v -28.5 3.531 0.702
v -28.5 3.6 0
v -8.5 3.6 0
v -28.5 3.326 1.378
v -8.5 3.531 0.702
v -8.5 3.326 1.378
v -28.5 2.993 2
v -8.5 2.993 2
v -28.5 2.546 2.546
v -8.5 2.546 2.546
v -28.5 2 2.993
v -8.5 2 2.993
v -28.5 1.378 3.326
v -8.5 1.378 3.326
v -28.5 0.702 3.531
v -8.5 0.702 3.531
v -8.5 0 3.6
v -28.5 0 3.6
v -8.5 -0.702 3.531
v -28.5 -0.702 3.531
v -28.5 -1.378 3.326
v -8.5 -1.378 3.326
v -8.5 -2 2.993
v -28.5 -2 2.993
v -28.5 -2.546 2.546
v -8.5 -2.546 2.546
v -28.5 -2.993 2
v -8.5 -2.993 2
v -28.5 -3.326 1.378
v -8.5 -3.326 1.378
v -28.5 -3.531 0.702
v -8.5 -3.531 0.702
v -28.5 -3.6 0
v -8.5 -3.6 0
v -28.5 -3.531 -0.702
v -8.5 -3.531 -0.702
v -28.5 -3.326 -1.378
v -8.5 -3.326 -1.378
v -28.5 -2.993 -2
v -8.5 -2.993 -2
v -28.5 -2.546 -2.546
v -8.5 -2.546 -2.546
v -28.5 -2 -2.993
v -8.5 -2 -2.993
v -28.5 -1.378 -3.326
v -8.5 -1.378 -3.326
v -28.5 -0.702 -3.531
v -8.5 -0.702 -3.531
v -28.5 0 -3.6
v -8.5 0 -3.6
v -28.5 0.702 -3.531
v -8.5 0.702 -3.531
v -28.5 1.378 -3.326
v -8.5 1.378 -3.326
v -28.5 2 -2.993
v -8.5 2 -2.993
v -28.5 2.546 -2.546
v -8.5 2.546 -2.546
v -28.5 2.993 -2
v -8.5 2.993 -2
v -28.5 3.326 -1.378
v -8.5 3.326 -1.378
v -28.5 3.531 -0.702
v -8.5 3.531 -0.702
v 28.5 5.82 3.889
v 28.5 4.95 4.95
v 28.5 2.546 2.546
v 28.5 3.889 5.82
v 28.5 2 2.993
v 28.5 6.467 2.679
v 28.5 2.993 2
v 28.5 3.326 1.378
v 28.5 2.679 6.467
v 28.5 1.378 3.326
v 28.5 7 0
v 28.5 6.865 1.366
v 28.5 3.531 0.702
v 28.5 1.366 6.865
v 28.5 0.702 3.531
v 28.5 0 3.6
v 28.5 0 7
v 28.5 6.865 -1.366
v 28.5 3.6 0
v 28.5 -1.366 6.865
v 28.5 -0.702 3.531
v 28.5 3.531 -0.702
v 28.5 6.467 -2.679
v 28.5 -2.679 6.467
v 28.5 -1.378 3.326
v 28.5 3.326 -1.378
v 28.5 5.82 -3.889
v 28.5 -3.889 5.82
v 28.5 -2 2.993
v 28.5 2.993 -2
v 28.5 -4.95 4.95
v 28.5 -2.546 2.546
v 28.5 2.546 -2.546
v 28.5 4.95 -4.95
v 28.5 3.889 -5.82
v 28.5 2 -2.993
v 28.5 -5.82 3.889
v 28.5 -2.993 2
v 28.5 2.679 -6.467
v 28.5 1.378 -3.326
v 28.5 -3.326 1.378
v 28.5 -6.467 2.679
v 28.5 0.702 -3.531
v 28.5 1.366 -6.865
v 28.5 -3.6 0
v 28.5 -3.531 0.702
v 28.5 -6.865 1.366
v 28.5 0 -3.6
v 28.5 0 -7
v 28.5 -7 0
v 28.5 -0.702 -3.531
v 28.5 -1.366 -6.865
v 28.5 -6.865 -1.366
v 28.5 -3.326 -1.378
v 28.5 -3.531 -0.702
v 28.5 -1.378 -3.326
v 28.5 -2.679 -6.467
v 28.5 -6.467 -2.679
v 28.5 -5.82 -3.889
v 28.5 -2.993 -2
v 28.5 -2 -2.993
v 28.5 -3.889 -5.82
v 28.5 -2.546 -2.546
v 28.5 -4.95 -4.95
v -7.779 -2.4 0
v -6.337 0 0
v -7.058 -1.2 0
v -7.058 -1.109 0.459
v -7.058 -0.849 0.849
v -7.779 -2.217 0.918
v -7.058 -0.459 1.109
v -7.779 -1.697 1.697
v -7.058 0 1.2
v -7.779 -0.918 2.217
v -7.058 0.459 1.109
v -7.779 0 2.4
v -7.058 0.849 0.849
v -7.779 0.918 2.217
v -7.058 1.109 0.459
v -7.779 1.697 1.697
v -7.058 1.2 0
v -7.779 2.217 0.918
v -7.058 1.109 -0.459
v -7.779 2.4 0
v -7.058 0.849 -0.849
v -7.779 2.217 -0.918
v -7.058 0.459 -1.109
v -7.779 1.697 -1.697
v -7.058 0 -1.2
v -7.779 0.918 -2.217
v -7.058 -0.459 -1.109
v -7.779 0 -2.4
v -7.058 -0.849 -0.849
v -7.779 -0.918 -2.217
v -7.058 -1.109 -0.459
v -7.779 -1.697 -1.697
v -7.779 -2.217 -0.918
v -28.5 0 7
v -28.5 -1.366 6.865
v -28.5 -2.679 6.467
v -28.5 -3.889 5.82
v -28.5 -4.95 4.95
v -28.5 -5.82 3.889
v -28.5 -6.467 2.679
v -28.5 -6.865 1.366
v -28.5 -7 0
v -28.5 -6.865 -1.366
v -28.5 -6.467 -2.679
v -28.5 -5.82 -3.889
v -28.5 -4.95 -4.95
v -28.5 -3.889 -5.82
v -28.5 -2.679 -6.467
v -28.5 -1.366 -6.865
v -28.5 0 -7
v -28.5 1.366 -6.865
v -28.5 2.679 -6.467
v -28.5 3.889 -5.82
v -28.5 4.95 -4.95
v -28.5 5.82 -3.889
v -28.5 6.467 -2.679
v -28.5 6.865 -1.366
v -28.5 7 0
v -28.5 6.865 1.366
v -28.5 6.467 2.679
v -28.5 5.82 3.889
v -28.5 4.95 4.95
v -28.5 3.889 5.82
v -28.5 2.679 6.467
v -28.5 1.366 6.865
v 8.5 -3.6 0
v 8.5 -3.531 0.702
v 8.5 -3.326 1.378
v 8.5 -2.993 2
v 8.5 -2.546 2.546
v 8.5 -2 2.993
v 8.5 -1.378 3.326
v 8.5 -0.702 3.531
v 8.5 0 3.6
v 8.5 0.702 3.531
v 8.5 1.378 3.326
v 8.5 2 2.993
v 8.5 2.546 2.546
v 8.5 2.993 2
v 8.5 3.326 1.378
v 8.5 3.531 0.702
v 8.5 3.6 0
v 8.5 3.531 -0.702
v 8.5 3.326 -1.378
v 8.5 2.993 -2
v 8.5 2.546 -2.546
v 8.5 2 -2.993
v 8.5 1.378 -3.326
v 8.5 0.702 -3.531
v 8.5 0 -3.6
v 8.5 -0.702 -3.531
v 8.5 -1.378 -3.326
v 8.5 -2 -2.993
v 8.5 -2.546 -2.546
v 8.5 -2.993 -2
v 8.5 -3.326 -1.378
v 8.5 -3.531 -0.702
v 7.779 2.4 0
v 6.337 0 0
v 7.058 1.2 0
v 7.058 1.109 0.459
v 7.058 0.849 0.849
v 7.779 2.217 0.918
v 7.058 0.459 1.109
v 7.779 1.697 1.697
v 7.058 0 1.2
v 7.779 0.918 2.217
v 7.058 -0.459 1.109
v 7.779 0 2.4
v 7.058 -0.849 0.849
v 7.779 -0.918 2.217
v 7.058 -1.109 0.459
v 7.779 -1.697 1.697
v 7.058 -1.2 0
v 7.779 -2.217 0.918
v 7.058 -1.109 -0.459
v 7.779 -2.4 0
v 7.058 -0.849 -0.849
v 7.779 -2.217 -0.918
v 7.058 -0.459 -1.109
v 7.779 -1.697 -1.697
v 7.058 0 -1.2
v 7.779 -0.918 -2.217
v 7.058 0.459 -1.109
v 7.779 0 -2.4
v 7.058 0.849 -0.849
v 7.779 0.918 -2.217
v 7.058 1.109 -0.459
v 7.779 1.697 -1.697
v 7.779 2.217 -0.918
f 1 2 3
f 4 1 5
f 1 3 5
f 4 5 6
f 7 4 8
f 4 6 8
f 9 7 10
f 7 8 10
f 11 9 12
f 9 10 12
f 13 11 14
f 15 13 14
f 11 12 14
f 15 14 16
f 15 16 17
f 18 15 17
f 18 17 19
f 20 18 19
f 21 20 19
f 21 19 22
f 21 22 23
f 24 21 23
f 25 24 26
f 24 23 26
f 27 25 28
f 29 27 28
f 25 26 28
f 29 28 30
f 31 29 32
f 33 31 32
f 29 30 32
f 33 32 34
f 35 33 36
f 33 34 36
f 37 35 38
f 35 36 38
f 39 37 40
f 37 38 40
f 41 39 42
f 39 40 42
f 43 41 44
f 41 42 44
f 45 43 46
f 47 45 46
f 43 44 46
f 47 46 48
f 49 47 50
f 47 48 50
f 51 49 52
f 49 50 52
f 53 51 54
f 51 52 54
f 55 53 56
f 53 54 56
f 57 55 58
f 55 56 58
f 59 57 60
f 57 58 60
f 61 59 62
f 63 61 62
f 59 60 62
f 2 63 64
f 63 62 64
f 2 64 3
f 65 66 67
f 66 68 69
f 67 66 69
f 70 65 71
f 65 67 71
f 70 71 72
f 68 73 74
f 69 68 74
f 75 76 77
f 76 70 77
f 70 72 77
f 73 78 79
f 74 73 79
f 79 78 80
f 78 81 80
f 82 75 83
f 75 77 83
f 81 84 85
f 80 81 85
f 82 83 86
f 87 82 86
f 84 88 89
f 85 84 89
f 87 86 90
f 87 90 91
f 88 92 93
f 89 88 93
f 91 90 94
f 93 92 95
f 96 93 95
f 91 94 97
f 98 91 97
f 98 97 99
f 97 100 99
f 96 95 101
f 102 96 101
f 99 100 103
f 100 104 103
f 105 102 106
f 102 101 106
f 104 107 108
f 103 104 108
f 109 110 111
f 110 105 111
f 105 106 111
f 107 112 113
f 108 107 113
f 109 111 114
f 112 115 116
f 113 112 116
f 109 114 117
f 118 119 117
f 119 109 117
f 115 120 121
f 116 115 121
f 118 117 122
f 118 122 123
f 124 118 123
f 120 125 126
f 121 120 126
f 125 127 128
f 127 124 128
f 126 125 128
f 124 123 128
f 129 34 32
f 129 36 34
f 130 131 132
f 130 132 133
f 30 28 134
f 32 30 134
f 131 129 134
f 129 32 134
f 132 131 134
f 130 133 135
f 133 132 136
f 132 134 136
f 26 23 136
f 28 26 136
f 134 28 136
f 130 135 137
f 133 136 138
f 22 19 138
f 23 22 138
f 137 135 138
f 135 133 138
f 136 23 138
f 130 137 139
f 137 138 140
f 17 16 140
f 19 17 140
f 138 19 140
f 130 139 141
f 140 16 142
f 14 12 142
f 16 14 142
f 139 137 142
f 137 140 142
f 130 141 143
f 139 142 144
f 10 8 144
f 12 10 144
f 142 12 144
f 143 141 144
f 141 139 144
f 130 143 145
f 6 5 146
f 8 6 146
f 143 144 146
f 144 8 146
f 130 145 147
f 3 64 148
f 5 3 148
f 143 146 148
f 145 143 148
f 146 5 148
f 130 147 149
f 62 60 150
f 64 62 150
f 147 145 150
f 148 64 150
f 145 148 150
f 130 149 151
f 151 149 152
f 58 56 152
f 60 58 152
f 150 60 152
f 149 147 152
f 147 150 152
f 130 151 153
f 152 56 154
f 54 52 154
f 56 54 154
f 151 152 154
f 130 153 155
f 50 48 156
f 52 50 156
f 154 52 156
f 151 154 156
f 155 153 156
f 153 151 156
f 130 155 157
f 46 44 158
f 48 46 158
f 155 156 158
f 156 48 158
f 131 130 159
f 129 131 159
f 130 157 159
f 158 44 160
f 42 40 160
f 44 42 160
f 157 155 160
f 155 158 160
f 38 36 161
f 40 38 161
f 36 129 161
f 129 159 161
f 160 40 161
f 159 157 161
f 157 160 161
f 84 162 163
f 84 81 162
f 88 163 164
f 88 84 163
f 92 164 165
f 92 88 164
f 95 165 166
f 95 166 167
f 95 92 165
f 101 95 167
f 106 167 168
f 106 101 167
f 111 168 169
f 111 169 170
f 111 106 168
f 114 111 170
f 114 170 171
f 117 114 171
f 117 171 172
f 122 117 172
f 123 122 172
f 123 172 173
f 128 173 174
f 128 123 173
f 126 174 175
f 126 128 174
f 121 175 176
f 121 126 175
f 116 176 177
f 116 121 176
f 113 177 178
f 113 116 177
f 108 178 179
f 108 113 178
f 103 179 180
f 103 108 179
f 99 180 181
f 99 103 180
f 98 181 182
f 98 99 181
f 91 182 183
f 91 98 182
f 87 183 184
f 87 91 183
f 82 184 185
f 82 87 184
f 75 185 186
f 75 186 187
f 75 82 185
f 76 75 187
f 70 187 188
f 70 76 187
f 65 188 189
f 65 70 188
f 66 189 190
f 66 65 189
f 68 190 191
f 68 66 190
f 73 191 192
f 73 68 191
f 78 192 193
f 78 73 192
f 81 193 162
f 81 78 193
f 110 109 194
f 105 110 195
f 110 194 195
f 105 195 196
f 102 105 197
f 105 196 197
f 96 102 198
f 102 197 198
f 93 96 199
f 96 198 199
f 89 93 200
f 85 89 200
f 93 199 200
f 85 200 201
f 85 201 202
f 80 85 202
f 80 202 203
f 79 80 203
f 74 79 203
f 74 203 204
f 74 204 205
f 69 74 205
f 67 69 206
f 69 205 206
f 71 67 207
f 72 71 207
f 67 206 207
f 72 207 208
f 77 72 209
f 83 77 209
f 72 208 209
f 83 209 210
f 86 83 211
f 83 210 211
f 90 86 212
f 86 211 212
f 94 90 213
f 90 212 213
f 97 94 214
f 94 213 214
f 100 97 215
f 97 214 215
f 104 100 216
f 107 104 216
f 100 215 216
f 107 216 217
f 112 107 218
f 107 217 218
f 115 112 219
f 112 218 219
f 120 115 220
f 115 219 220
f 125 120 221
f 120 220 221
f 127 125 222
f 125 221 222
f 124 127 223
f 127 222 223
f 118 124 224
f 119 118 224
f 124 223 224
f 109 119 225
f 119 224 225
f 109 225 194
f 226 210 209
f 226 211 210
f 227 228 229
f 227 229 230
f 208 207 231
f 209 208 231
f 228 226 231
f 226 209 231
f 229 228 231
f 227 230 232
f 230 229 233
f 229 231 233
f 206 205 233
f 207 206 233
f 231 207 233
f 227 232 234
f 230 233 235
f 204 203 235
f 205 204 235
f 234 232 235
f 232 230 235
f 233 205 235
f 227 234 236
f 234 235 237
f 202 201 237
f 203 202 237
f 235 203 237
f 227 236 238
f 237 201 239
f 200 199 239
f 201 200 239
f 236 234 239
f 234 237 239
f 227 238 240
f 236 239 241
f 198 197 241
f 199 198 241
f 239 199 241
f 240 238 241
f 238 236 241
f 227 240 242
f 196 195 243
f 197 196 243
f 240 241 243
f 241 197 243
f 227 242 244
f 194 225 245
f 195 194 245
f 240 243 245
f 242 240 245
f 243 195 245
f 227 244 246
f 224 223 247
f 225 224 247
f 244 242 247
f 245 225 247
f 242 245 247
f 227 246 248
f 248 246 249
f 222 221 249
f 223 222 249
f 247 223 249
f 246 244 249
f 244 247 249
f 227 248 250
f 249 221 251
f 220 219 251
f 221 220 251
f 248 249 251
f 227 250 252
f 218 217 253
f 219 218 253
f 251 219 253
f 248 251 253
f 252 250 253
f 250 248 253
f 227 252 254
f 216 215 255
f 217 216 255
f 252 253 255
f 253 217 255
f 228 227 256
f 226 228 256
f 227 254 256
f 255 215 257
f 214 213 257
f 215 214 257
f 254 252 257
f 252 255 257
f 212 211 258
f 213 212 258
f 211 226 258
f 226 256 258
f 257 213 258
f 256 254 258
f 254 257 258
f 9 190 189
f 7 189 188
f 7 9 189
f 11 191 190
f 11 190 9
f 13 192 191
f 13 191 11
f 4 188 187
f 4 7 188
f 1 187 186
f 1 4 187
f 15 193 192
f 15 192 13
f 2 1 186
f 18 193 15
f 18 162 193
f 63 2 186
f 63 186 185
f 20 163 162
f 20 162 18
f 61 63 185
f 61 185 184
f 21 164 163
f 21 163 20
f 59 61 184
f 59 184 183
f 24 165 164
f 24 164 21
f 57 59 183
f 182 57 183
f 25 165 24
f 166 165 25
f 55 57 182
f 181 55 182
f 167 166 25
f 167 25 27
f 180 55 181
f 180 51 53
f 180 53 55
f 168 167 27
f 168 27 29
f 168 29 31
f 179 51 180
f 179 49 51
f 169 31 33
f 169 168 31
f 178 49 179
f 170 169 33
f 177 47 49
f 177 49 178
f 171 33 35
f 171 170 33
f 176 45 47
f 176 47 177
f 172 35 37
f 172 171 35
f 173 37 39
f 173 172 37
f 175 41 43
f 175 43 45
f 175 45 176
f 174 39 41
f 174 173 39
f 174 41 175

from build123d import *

# Parameters (mm, degrees)
F0_W     = 57
F0_H     = 7
F3_D     = 7.2
F3_DEPTH = 20
F3_TIP   = 2.1630982285
F5_D     = 7.2
F5_DEPTH = 20
F5_TIP   = 2.1630982285


with BuildPart() as f1:
    # F0 (on Front) → F1 (revolve)
    with BuildSketch(Plane.XZ):
        with Locations((0, 3.5)):
            Rectangle(F0_W, F0_H)
    revolve(axis=Axis((-4.6887677163, 0, 0), (1, 0, 0)))

    # F3
    with Locations(Plane.YZ.offset(28.5)):
        with Locations((0, 0)):
            Hole(F3_D / 2, depth=F3_DEPTH)
            with Locations((0, 0, -(F3_DEPTH + F3_TIP / 2))):  # 118° drill point
                Cone(0, F3_D / 2, F3_TIP, mode=Mode.SUBTRACT)

    # F5
    with Locations(Plane(origin=(-28.5, 0, 0), x_dir=(0, -1, 0), z_dir=(-1, 0, 0))):
        with Locations((0, 0)):
            Hole(F5_D / 2, depth=F5_DEPTH)
            with Locations((0, 0, -(F5_DEPTH + F5_TIP / 2))):  # 118° drill point
                Cone(0, F5_D / 2, F5_TIP, mode=Mode.SUBTRACT)


solid = f1.part
